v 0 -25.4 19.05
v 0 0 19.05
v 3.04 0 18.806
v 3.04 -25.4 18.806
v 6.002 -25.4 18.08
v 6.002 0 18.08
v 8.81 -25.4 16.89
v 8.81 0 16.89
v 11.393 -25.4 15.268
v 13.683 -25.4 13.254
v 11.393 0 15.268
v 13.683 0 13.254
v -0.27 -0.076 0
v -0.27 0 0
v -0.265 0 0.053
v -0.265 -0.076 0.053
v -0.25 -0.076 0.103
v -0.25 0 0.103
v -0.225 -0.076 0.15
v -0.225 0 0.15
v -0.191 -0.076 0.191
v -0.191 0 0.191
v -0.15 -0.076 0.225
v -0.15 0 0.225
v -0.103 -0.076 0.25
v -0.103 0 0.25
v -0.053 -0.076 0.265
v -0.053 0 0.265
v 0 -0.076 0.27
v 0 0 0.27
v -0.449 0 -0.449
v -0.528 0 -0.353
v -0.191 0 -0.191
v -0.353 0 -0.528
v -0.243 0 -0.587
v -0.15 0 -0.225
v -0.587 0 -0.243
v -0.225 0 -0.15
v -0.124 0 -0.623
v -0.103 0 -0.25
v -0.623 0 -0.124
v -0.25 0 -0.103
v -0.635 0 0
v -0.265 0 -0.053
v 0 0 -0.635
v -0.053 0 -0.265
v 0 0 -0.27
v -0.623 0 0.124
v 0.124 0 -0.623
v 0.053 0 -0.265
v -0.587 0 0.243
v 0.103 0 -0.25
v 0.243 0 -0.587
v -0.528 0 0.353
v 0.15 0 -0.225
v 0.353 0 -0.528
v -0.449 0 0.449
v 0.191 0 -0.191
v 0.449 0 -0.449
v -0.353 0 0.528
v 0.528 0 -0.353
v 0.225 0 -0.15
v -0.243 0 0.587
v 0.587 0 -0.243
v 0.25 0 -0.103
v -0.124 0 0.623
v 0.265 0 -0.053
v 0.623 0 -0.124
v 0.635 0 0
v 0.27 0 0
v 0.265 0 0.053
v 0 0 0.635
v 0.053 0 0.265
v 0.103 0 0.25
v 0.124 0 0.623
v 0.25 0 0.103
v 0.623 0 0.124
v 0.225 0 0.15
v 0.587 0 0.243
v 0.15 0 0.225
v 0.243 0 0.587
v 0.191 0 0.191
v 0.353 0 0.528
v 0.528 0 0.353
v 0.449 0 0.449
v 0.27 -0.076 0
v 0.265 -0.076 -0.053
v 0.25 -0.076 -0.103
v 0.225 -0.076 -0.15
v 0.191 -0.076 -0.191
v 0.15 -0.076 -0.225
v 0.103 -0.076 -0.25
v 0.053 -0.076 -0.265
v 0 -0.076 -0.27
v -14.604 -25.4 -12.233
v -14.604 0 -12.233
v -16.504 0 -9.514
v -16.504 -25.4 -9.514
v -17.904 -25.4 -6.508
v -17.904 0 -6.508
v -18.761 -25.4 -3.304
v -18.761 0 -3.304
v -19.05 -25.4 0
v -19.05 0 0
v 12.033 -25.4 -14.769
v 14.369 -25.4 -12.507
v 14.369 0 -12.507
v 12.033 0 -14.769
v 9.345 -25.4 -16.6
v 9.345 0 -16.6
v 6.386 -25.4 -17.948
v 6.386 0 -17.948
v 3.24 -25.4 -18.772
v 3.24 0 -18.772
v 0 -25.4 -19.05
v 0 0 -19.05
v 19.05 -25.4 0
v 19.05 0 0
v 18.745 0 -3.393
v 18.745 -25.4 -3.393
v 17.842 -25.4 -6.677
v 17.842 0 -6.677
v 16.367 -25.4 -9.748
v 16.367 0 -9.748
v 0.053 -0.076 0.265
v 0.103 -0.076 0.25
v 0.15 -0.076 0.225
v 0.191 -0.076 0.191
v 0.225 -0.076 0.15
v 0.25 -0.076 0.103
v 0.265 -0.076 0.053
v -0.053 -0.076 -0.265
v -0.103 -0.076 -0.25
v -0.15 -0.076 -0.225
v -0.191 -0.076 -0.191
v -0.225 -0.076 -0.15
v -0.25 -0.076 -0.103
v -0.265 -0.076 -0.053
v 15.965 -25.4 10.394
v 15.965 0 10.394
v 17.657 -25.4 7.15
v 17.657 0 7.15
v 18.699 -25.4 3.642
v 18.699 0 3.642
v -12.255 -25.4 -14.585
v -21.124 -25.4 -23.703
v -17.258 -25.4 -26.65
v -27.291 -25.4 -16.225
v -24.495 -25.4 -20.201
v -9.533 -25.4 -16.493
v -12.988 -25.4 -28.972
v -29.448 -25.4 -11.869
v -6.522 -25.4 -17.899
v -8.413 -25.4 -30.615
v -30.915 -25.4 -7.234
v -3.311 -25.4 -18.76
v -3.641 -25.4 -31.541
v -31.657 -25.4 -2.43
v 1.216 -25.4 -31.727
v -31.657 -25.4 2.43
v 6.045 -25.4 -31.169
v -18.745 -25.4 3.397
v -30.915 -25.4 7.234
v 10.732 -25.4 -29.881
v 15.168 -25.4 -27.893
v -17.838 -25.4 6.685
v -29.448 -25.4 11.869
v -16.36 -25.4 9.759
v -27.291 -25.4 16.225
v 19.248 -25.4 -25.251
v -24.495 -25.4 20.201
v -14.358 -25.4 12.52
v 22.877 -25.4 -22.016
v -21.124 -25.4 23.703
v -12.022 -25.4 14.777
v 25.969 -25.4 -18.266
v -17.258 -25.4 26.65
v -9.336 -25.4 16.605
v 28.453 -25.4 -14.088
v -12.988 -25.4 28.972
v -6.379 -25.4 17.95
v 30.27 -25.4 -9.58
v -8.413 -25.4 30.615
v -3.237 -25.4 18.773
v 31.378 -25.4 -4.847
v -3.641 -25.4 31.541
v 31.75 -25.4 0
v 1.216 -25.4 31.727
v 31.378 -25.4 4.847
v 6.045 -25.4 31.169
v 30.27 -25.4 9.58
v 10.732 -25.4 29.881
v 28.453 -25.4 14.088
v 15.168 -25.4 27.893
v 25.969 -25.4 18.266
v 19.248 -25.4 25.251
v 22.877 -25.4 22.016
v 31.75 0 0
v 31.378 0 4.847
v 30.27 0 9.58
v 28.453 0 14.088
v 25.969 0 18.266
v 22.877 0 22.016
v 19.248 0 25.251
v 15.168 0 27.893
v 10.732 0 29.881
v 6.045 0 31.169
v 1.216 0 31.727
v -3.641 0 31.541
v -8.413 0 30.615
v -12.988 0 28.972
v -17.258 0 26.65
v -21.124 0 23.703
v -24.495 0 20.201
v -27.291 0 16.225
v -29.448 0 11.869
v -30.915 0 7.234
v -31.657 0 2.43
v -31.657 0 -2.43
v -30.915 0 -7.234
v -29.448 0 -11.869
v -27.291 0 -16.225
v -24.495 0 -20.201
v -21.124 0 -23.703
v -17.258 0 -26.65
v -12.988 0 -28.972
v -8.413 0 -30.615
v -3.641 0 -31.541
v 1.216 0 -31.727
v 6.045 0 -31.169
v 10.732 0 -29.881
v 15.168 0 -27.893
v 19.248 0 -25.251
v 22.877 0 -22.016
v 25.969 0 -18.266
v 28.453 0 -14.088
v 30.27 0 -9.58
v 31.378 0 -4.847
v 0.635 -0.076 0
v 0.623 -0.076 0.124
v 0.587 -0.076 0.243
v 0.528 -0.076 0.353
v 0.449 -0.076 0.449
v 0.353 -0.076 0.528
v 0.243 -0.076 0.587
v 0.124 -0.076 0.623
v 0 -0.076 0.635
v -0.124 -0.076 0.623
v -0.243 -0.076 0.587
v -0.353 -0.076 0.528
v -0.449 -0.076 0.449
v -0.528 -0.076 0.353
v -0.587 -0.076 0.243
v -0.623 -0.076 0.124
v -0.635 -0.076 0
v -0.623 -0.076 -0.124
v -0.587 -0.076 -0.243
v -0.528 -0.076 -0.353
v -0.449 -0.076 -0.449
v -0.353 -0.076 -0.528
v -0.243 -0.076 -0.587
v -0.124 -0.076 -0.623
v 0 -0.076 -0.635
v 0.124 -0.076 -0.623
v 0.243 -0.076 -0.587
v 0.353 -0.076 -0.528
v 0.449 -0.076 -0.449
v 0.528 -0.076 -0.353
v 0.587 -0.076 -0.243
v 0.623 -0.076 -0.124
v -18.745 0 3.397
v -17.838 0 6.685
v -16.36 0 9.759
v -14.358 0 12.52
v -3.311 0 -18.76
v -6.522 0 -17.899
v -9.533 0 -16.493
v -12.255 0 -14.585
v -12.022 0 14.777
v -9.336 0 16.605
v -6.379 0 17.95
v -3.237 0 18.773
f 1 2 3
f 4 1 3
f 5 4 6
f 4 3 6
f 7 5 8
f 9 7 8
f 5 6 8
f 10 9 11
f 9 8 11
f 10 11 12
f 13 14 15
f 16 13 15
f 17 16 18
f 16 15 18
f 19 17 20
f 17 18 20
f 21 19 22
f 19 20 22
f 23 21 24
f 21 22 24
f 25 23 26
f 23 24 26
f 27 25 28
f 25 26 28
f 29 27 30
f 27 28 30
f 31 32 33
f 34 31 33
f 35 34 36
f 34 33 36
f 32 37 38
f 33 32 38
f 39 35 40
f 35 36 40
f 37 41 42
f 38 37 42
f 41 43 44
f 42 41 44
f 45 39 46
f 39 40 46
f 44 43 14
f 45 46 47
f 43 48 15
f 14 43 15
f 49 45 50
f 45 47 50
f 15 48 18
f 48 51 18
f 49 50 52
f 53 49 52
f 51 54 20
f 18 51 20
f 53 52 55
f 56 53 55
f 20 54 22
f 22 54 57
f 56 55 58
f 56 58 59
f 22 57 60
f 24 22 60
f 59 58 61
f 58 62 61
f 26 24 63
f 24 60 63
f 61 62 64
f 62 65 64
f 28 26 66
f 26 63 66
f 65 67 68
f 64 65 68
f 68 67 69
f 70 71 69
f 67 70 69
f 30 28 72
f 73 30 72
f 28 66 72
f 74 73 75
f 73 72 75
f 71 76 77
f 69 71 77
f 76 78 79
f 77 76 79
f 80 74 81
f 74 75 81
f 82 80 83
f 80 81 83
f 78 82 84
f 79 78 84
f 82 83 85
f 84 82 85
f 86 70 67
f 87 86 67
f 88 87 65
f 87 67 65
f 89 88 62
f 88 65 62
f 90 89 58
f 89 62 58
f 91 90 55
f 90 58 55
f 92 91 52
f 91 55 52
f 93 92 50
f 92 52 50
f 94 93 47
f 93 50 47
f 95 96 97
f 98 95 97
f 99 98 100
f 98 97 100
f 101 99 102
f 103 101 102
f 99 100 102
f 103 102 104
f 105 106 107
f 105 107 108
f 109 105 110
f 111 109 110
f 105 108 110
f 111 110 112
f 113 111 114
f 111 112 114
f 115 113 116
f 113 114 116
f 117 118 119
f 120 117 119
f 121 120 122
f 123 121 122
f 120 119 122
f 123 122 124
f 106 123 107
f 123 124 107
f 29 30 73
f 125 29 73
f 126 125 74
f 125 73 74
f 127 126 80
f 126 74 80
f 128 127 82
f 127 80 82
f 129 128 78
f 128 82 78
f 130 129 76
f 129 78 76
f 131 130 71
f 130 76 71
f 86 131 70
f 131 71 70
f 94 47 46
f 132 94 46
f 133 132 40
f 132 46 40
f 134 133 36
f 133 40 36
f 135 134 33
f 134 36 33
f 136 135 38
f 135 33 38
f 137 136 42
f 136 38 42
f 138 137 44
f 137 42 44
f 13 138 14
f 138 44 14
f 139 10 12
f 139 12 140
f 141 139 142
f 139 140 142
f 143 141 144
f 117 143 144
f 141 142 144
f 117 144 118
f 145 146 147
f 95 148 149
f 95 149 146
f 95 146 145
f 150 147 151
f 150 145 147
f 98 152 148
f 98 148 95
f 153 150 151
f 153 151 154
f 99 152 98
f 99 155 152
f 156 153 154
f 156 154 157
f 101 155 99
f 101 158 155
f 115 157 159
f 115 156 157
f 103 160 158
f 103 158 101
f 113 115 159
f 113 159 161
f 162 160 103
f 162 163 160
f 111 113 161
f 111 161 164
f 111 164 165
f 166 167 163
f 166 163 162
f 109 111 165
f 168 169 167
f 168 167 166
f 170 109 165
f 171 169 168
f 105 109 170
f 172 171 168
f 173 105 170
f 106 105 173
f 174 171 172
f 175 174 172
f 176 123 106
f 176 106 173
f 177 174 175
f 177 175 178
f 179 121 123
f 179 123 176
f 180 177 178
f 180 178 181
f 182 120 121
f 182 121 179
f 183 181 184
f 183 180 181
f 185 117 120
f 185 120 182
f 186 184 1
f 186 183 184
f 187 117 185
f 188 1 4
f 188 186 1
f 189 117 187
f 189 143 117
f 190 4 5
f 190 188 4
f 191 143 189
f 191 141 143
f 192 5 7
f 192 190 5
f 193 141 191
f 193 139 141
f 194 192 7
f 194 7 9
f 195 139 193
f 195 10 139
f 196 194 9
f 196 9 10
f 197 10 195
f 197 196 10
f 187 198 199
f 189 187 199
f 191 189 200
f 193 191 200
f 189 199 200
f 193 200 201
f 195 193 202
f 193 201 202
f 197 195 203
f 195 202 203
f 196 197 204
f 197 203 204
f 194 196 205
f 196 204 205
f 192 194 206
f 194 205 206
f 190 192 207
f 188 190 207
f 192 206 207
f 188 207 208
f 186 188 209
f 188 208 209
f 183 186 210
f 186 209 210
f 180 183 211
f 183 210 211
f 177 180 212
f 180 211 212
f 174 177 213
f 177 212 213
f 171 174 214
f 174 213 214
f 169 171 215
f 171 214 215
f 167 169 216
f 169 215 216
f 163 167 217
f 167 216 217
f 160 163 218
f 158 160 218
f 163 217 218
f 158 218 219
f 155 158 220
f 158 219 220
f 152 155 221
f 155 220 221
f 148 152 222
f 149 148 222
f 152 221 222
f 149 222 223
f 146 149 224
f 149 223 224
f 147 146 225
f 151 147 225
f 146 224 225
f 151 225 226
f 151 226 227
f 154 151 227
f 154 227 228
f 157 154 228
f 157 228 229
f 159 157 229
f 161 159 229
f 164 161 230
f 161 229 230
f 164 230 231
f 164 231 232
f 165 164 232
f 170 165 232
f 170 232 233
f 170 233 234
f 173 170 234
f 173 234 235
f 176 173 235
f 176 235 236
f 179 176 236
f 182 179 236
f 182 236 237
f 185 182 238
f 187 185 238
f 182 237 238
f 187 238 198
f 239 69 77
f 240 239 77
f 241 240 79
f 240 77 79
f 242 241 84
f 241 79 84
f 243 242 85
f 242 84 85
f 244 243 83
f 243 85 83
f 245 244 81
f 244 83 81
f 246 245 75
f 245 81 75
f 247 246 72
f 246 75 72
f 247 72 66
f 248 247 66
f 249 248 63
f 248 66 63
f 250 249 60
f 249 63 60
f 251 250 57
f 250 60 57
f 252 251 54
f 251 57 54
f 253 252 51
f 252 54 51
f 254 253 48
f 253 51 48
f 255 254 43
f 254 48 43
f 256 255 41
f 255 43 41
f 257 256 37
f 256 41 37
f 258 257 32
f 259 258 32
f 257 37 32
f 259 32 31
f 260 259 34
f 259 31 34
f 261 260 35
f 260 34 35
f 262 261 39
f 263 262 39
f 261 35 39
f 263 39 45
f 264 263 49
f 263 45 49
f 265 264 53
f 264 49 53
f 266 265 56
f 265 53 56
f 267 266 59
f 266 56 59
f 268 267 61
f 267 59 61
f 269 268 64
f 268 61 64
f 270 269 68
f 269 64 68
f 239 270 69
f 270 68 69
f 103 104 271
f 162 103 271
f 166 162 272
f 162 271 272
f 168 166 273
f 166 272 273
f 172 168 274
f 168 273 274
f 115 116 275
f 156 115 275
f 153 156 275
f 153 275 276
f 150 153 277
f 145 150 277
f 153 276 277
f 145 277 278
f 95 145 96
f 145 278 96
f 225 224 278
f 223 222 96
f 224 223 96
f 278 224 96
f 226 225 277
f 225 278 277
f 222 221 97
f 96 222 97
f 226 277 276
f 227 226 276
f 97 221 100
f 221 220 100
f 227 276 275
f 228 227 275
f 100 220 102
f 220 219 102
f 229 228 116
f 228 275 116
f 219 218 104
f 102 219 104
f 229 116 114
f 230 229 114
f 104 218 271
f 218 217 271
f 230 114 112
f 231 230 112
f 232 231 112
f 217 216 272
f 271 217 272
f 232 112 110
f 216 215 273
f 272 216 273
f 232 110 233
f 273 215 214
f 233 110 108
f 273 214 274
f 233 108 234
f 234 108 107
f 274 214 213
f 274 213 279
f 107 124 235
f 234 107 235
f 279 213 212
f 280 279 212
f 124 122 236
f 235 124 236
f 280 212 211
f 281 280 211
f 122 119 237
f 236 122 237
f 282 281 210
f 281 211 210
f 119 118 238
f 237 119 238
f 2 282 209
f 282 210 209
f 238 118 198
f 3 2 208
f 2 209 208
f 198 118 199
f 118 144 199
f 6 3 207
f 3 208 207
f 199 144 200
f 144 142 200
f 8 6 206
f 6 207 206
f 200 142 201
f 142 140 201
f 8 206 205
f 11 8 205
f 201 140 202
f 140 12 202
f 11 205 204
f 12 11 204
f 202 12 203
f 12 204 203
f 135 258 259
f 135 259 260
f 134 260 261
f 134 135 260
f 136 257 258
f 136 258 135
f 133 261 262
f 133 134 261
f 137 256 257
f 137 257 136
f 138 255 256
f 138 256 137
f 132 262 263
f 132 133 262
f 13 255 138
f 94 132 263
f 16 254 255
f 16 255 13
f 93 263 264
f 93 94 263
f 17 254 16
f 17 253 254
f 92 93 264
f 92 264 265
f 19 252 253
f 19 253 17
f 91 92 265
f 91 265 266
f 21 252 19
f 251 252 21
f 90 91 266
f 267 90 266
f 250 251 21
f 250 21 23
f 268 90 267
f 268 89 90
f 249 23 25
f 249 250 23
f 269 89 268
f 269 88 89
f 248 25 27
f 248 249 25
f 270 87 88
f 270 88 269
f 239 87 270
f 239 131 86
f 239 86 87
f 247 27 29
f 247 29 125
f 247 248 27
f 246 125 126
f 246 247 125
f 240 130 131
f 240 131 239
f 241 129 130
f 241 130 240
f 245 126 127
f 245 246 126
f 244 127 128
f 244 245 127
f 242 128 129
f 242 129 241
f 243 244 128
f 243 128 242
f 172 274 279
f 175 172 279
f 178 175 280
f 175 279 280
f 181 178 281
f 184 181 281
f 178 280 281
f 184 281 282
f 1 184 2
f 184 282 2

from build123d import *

# Parameters (mm, degrees)
F0_R     = 0.635
F1_DEPTH = 0.0762
F2_R     = 31.75
F4_DEPTH = 25.4
F5_DEPTH = 25.4
F6_DEPTH = 25.4


# Not quite as in the source:
# - a feature of the source that left no trace in its solid (it failed there, or was rolled back) is left out


with BuildPart() as f1:
    # F0 (on Front) → F1 (new body)
    with BuildSketch(Plane.XZ):
        Circle(F0_R)
        with BuildLine():
            ThreePointArc((0, 0.2700978897), (0.1909880494, 0.1909880494), (0.2700978897, 0))
            ThreePointArc((0.2700978897, 0), (0.1909880494, -0.1909880494), (0, -0.2700978897))
            ThreePointArc((0, -0.2700978897), (-0.1909880494, -0.1909880494), (-0.2700978897, 0))
            ThreePointArc((-0.2700978897, 0), (-0.1909880494, 0.1909880494), (0, 0.2700978897))
        make_face(mode=Mode.SUBTRACT)
    extrude(amount=F1_DEPTH)


with BuildPart() as f4:
    # F2 (on Front) → F4 (new body)
    with BuildSketch(Plane.XZ):
        Circle(F2_R)
        with BuildLine():
            ThreePointArc((13.6830996254, 13.2542553409), (17.6573716598, 7.1498060161), (19.05, 0))
            ThreePointArc((19.05, 0), (17.8415186316, -6.6770287492), (14.3694002186, -12.5069115835))
            ThreePointArc((14.3694002186, -12.5069115835), (7.8944865043, -17.3372311178), (0, -19.05))
            ThreePointArc((0, -19.05), (-8.0582243019, -17.2617357499), (-14.6035630984, -12.2326793807))
            ThreePointArc((-14.6035630984, -12.2326793807), (-17.903915452, -6.5078653557), (-19.05, 0))
            ThreePointArc((-19.05, 0), (-17.8384881524, 6.6851208244), (-14.358048248, 12.5199421128))
            ThreePointArc((-14.358048248, 12.5199421128), (-7.8866216706, 17.3408102067), (0, 19.05))
            ThreePointArc((0, 19.05), (7.4299709204, 17.5413235567), (13.6830996254, 13.2542553409))
        make_face(mode=Mode.SUBTRACT)
    extrude(amount=F4_DEPTH)

    # F2 (on Front) → F5 (join)
    with BuildSketch(Plane.XZ):
        Circle(F2_R)
        with BuildLine():
            ThreePointArc((13.6830996254, 13.2542553409), (17.6573716598, 7.1498060161), (19.05, 0))
            ThreePointArc((19.05, 0), (17.8415186316, -6.6770287492), (14.3694002186, -12.5069115835))
            ThreePointArc((14.3694002186, -12.5069115835), (7.8944865043, -17.3372311178), (0, -19.05))
            ThreePointArc((0, -19.05), (-8.0582243019, -17.2617357499), (-14.6035630984, -12.2326793807))
            ThreePointArc((-14.6035630984, -12.2326793807), (-17.903915452, -6.5078653557), (-19.05, 0))
            ThreePointArc((-19.05, 0), (-17.8384881524, 6.6851208244), (-14.358048248, 12.5199421128))
            ThreePointArc((-14.358048248, 12.5199421128), (-7.8866216706, 17.3408102067), (0, 19.05))
            ThreePointArc((0, 19.05), (7.4299709204, 17.5413235567), (13.6830996254, 13.2542553409))
        make_face(mode=Mode.SUBTRACT)
    extrude(amount=F5_DEPTH)

    # F2 (on Front) → F6 (join)
    with BuildSketch(Plane.XZ):
        Circle(F2_R)
        with BuildLine():
            ThreePointArc((13.6830996254, 13.2542553409), (17.6573716598, 7.1498060161), (19.05, 0))
            ThreePointArc((19.05, 0), (17.8415186316, -6.6770287492), (14.3694002186, -12.5069115835))
            ThreePointArc((14.3694002186, -12.5069115835), (7.8944865043, -17.3372311178), (0, -19.05))
            ThreePointArc((0, -19.05), (-8.0582243019, -17.2617357499), (-14.6035630984, -12.2326793807))
            ThreePointArc((-14.6035630984, -12.2326793807), (-17.903915452, -6.5078653557), (-19.05, 0))
            ThreePointArc((-19.05, 0), (-17.8384881524, 6.6851208244), (-14.358048248, 12.5199421128))
            ThreePointArc((-14.358048248, 12.5199421128), (-7.8866216706, 17.3408102067), (0, 19.05))
            ThreePointArc((0, 19.05), (7.4299709204, 17.5413235567), (13.6830996254, 13.2542553409))
        make_face(mode=Mode.SUBTRACT)
    extrude(amount=F6_DEPTH)


solid = Compound([f1.part, f4.part])
